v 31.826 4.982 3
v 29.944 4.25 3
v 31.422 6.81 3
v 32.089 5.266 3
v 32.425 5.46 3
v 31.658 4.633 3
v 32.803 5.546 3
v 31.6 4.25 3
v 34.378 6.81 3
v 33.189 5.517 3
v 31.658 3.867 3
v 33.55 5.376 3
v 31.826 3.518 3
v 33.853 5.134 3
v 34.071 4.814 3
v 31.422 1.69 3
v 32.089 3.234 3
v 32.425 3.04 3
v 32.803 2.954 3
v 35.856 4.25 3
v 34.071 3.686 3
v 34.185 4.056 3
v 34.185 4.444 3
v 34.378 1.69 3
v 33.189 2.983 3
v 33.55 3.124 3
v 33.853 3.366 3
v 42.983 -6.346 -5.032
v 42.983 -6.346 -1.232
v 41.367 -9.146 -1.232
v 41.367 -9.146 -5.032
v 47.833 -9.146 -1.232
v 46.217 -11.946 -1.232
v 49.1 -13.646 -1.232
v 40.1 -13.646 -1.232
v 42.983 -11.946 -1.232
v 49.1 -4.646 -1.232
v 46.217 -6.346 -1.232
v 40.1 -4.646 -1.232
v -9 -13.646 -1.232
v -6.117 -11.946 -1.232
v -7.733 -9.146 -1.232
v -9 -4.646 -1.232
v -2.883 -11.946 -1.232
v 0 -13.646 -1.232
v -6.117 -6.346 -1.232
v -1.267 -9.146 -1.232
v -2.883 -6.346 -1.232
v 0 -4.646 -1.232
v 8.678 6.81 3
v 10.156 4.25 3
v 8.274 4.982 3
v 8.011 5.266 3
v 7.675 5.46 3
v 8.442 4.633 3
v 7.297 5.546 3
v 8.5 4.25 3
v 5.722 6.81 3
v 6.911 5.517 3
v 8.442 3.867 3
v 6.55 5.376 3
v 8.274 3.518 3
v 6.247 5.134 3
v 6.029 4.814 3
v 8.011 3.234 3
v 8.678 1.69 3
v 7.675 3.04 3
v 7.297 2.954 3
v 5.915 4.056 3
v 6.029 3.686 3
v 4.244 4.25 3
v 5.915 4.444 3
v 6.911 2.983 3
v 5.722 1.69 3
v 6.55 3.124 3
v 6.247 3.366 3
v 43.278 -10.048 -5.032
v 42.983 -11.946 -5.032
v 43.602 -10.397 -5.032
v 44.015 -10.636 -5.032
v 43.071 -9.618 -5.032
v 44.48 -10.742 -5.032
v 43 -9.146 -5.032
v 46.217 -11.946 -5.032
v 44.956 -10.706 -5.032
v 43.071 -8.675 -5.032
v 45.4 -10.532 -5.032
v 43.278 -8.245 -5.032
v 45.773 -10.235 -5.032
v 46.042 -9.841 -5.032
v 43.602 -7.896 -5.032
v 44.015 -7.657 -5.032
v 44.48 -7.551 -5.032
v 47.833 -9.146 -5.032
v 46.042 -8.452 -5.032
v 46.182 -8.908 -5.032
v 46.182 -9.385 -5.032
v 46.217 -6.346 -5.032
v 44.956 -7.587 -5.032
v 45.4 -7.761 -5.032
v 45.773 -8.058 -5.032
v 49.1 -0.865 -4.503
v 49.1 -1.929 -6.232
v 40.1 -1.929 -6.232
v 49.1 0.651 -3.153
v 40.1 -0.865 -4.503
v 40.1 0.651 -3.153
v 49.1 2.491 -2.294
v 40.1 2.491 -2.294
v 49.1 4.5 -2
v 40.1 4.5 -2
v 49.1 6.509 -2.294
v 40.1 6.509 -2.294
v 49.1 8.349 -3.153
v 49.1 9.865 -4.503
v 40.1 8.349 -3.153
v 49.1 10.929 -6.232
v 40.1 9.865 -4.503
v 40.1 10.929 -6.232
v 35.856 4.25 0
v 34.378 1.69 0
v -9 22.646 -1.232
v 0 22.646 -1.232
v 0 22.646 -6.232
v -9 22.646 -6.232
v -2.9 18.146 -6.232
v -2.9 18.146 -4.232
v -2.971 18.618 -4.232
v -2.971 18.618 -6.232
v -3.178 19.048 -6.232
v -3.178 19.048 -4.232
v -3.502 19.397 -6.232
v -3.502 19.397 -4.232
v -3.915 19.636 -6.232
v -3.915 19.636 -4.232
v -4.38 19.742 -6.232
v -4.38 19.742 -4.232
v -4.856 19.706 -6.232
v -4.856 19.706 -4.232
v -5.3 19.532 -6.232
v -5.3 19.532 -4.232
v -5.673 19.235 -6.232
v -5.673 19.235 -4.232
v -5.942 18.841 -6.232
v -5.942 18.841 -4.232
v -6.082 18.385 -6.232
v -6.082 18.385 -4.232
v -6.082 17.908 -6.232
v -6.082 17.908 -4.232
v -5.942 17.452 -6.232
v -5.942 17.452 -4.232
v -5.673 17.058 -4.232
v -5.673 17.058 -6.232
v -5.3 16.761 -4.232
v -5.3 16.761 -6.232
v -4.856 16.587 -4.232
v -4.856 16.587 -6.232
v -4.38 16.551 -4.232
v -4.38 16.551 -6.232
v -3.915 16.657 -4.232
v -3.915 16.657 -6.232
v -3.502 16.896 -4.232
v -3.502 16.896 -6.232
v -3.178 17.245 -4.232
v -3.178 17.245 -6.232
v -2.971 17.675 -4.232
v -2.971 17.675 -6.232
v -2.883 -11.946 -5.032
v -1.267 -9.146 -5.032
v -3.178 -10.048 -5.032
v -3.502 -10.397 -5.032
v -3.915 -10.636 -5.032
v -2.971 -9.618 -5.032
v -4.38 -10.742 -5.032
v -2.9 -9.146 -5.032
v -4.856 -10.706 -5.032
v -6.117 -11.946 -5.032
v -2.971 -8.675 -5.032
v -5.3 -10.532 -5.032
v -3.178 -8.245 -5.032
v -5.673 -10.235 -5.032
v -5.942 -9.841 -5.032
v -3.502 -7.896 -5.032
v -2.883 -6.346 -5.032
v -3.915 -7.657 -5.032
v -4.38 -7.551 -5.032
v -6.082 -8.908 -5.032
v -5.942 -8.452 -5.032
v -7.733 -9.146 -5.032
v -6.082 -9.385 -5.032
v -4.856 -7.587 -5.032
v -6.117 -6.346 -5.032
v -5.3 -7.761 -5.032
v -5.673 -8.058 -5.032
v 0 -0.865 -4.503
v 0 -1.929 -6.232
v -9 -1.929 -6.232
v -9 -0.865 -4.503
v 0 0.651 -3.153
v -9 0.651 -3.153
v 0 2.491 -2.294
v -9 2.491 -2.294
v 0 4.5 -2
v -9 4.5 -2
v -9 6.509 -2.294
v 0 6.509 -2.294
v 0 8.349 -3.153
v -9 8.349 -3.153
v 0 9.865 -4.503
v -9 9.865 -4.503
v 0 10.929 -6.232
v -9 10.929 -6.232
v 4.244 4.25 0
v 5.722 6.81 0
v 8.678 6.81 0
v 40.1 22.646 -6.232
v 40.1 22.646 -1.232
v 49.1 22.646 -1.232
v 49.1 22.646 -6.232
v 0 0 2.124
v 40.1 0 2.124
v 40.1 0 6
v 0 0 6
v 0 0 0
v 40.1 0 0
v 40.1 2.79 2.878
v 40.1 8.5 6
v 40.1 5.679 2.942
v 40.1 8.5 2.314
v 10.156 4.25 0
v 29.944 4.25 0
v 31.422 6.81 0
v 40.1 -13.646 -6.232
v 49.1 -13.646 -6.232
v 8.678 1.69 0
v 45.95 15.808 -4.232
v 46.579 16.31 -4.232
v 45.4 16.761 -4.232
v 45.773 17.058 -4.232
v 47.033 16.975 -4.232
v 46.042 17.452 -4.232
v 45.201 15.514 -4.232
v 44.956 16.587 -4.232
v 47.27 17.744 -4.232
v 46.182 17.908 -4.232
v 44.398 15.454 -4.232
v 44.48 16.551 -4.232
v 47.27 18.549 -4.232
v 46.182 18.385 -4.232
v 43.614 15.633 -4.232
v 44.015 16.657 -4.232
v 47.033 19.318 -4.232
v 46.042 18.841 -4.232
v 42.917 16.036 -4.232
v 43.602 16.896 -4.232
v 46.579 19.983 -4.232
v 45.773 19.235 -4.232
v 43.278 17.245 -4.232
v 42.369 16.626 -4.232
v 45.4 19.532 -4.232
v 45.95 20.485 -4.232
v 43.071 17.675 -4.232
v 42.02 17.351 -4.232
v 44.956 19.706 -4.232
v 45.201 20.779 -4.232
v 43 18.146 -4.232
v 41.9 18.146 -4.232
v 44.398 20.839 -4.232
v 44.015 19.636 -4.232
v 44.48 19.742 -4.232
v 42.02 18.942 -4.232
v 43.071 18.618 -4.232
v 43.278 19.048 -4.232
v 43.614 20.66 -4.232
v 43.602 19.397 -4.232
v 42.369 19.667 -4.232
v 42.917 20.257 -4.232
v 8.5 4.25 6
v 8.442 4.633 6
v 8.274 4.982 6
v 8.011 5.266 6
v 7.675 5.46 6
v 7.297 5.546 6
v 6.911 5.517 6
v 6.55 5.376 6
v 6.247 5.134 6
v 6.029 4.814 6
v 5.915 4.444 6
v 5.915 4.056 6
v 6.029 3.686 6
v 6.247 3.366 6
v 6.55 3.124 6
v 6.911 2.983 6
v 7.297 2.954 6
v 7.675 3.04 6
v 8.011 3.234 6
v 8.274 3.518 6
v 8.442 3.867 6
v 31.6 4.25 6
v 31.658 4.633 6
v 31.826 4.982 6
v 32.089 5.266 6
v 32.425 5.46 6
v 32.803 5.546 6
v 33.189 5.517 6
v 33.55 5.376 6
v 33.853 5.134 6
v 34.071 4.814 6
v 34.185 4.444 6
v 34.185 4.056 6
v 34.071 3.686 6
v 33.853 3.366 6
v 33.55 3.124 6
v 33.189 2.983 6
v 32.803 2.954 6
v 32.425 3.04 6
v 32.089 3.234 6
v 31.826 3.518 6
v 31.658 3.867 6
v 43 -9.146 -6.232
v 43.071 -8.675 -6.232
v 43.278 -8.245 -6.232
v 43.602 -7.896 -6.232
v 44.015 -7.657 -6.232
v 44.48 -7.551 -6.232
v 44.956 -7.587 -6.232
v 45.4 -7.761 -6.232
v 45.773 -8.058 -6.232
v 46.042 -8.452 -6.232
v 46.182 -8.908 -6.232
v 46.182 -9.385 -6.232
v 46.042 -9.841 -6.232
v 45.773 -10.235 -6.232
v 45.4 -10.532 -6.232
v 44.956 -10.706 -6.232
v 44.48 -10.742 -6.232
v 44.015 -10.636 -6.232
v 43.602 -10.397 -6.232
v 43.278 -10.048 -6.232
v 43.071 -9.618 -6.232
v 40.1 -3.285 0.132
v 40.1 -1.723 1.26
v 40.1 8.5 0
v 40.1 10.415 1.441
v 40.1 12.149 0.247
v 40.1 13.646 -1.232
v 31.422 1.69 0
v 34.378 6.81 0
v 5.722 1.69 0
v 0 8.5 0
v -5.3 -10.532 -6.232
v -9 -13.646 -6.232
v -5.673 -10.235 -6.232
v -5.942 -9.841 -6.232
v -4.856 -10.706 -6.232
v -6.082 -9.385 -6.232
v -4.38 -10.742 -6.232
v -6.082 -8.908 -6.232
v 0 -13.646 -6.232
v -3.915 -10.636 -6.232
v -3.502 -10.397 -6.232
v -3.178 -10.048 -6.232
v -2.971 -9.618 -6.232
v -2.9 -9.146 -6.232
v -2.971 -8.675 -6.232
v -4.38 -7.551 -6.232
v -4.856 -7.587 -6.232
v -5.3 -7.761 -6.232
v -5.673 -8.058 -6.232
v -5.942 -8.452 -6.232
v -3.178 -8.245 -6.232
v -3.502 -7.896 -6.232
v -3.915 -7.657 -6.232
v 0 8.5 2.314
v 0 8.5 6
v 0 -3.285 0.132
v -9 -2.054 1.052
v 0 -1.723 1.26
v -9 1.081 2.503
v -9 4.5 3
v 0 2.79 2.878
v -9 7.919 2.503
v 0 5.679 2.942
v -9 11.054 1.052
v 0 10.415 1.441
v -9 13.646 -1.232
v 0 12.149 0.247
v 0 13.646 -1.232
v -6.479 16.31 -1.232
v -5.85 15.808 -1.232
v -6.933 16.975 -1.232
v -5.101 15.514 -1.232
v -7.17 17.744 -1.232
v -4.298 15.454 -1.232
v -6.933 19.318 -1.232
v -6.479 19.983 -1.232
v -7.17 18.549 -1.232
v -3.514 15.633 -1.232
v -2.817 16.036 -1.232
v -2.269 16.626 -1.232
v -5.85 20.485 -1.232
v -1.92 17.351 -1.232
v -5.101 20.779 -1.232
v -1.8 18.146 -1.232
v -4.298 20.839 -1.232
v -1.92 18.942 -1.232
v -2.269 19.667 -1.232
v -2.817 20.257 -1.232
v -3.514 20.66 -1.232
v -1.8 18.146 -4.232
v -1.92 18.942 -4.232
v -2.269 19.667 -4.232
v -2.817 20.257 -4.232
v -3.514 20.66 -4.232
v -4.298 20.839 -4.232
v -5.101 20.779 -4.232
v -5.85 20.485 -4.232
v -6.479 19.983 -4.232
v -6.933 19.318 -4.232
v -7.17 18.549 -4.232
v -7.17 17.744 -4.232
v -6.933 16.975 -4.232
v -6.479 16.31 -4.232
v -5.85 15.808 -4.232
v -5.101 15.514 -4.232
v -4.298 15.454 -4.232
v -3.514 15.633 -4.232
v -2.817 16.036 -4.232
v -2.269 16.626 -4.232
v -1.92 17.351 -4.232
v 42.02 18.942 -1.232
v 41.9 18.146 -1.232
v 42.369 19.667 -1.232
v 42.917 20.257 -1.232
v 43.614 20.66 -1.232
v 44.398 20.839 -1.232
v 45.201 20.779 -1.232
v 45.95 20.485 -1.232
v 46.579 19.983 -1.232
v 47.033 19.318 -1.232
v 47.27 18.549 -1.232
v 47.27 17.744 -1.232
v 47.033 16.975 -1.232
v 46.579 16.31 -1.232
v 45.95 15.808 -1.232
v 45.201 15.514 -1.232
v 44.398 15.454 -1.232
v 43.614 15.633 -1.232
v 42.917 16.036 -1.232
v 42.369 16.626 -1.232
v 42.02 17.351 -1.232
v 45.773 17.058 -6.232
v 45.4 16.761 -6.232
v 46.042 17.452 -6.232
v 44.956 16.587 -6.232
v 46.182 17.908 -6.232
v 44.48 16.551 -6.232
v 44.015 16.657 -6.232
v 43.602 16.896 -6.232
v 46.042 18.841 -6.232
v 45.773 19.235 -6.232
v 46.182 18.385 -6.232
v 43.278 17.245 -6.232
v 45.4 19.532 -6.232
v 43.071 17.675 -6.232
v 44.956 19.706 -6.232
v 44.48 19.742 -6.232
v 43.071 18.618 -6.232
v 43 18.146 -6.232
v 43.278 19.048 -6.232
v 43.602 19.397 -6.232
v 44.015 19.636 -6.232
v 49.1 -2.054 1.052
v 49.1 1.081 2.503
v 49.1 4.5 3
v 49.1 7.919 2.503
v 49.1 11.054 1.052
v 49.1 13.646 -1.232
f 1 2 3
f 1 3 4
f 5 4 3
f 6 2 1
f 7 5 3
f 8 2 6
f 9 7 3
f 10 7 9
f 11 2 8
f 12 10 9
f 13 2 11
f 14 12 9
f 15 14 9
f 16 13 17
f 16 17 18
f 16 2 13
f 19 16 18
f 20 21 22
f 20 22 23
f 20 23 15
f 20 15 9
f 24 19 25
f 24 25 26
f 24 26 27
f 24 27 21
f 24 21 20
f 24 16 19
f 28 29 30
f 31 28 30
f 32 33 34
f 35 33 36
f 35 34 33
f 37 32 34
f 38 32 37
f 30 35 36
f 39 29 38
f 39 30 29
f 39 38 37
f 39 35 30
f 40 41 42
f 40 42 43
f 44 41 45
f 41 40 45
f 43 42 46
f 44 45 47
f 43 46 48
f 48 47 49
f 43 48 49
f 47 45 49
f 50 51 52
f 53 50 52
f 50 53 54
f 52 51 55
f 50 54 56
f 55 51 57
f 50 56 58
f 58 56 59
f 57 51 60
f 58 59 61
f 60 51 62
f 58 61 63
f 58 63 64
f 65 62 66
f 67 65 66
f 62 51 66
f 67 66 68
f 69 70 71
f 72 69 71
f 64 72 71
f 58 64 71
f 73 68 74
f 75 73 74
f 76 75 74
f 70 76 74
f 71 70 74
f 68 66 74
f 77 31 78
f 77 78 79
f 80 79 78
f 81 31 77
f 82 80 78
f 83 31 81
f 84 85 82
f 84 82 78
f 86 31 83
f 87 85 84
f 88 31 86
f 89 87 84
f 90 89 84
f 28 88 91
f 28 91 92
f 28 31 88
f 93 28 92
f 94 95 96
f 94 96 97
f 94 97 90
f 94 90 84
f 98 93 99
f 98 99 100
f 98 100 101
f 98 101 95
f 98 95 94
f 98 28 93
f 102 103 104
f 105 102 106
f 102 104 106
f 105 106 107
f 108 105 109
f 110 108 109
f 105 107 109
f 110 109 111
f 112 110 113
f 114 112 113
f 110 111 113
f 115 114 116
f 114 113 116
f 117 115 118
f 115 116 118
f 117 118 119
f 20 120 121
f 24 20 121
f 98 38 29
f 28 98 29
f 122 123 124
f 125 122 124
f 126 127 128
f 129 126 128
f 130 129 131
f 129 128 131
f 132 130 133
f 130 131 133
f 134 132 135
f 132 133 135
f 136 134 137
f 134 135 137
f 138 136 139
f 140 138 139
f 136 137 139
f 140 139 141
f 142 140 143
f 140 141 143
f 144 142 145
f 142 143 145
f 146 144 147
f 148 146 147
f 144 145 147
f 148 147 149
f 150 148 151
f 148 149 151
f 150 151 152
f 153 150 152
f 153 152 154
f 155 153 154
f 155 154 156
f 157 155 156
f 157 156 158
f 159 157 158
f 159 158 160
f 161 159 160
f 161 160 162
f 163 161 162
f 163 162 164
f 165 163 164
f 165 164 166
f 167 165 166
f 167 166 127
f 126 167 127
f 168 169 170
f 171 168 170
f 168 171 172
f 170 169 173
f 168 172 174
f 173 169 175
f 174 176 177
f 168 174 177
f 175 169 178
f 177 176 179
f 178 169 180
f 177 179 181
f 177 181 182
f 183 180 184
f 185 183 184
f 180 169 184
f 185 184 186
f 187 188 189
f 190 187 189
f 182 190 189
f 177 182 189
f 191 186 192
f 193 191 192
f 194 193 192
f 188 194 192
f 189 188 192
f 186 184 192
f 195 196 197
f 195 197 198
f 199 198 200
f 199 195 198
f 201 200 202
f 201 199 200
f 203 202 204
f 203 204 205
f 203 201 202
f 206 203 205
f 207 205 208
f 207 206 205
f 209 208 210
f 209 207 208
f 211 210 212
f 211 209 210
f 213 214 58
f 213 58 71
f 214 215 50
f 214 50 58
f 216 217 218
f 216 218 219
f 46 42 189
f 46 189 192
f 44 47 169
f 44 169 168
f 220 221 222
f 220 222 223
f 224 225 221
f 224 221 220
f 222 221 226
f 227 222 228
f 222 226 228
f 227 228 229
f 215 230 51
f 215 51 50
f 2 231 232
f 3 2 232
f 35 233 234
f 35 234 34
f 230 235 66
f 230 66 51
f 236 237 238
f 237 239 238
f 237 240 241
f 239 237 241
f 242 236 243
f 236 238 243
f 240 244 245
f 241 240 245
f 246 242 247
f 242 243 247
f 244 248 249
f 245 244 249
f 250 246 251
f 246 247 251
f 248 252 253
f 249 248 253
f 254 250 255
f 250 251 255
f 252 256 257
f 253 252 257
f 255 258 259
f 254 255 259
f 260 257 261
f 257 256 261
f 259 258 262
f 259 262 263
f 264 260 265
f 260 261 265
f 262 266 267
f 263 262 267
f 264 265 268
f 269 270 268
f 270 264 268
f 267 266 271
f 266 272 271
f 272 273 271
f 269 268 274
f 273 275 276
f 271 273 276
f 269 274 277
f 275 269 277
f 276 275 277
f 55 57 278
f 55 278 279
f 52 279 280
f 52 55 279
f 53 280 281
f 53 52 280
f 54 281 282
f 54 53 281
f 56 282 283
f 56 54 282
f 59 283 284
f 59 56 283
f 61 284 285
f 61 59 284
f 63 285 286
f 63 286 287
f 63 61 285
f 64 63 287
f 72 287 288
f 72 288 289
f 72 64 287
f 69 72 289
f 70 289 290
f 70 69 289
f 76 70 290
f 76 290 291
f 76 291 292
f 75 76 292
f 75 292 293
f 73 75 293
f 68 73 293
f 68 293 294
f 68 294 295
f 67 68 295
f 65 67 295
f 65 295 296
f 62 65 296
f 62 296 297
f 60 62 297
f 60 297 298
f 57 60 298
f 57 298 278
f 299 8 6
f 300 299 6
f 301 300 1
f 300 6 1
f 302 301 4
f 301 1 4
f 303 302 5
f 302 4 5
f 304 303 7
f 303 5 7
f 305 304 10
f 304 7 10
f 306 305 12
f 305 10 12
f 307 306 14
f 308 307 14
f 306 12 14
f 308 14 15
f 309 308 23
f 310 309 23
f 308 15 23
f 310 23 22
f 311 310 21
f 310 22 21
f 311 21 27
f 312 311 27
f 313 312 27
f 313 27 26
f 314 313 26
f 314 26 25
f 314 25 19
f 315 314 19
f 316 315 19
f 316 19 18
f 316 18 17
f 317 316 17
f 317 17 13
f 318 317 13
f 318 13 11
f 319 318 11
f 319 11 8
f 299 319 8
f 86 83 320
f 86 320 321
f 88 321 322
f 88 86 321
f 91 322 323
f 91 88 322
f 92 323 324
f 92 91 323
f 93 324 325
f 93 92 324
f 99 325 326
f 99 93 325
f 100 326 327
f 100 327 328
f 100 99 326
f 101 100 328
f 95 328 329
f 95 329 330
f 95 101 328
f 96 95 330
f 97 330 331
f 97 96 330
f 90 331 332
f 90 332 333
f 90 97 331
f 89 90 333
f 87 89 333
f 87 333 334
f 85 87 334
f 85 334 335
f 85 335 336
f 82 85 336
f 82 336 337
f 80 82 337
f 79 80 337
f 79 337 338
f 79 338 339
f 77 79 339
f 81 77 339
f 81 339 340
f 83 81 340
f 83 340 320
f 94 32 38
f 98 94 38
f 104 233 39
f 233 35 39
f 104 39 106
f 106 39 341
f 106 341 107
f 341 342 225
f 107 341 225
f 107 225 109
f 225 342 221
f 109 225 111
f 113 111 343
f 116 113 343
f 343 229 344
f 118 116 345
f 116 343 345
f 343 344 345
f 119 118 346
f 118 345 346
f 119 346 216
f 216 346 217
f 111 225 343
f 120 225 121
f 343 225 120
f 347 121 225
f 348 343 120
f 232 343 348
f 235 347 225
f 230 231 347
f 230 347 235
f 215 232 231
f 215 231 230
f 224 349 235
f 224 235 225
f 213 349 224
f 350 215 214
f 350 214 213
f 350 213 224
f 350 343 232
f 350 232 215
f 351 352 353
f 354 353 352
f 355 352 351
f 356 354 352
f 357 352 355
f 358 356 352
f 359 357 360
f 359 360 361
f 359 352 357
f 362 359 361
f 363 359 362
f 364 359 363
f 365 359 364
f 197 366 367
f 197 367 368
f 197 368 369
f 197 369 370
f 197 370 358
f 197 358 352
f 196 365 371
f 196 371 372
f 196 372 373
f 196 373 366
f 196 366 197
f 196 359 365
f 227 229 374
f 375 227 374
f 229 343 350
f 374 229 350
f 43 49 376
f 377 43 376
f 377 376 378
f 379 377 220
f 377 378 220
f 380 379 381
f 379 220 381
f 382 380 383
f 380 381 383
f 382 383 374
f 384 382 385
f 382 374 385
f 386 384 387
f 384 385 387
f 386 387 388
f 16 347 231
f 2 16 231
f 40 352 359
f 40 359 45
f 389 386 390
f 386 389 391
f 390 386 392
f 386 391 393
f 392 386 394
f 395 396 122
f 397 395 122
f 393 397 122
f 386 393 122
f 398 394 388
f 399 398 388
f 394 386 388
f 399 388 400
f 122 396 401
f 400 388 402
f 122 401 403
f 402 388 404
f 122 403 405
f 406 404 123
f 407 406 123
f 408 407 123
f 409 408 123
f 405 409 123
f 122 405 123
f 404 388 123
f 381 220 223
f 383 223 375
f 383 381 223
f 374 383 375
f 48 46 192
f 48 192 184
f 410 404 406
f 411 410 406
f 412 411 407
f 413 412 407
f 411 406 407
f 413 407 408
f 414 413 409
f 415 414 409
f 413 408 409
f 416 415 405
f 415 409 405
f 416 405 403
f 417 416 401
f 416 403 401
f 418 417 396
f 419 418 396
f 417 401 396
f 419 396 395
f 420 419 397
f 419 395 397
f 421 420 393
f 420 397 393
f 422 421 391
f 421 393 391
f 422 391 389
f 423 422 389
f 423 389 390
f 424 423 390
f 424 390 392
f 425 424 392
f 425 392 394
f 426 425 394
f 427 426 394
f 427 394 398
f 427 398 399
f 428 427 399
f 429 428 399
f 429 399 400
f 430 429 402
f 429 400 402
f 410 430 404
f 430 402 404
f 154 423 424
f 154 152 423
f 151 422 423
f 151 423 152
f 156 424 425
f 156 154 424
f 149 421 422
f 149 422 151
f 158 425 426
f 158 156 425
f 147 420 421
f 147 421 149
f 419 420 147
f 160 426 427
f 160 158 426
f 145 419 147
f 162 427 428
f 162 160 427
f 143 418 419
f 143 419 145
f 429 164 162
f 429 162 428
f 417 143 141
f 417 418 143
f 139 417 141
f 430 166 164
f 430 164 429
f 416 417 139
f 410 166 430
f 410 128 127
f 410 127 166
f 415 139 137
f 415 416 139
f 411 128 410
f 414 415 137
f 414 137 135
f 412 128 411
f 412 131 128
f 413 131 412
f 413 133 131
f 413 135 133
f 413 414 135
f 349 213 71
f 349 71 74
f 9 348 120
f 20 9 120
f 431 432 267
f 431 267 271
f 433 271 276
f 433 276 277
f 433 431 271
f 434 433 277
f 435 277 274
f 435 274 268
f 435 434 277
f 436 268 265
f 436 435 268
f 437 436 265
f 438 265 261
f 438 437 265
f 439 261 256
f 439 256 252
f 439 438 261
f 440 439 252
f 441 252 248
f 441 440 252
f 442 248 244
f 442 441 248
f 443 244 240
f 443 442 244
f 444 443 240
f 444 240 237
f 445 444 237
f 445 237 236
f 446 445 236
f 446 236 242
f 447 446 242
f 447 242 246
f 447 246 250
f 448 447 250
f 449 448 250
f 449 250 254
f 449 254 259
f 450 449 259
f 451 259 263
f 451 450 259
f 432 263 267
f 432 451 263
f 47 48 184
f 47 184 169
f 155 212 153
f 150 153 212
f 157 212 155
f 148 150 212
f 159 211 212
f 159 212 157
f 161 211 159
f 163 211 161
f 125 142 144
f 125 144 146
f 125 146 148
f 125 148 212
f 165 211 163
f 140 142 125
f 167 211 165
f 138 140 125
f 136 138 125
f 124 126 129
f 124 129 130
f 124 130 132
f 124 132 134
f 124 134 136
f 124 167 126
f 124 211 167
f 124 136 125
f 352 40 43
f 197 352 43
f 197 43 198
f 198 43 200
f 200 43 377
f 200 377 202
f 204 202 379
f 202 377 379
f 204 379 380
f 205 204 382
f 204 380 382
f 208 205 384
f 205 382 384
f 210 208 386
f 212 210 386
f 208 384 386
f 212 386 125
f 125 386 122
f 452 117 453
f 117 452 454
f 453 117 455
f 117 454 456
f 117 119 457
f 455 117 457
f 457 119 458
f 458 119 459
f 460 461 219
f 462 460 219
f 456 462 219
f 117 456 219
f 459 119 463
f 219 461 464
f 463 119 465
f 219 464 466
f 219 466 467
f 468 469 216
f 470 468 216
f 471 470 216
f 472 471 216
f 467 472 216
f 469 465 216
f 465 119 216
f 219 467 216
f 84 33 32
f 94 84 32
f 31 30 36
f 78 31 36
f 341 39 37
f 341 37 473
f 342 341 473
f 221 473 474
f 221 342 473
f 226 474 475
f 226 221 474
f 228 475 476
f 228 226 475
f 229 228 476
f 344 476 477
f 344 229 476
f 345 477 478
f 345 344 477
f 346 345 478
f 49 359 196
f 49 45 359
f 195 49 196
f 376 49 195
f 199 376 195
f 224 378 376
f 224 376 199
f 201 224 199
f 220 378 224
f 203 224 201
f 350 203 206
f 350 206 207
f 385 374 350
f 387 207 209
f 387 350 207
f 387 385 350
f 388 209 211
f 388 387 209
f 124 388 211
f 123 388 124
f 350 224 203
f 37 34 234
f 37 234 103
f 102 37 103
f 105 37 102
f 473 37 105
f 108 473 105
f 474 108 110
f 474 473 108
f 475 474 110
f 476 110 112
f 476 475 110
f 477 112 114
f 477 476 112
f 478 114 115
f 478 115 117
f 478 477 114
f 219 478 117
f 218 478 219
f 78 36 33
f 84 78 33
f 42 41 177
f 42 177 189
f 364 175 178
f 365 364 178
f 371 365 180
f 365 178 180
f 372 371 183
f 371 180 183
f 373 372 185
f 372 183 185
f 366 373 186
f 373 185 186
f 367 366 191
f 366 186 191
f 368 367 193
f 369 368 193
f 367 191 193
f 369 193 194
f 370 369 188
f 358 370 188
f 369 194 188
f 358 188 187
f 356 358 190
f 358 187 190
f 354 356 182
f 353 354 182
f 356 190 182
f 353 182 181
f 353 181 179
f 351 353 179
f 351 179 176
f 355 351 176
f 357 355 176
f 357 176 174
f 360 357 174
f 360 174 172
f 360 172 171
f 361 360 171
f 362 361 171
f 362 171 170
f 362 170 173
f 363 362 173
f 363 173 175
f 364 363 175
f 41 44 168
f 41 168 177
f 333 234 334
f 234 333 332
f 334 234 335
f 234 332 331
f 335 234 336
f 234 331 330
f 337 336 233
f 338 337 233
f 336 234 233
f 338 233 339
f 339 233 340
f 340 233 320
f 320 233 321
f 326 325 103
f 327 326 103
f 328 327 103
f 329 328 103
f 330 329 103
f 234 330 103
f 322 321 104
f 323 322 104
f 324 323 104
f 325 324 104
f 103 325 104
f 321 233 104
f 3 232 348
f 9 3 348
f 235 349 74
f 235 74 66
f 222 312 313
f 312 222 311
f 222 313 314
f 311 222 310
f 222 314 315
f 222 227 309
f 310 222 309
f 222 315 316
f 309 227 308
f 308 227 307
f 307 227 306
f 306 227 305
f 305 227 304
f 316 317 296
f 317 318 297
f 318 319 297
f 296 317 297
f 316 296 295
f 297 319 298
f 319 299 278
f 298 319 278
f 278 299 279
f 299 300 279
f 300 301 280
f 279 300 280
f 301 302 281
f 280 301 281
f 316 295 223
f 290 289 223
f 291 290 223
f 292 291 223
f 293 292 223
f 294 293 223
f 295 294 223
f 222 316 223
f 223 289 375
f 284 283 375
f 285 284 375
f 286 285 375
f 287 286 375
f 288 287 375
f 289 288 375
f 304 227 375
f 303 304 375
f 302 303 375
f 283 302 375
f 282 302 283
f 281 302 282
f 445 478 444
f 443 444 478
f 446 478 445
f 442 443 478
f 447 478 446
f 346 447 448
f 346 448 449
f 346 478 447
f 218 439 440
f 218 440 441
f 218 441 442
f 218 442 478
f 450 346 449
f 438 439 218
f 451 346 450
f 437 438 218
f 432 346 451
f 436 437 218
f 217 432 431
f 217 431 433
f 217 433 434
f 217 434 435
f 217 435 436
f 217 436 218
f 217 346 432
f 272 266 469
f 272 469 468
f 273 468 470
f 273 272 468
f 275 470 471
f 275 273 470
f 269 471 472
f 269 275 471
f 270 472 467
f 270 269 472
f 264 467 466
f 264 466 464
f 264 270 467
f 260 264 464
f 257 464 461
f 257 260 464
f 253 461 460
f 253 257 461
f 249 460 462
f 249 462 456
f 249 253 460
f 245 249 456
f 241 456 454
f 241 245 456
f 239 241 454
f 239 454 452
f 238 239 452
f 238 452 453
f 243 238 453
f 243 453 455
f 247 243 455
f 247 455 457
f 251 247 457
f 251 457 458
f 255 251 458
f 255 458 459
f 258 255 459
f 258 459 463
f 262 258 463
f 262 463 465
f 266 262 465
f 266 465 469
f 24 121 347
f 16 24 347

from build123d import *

# Parameters (mm, degrees)
SKETCH_W        = 20.1
SKETCH_H        = 8.5
SKETCH_R        = 1.3
PAD_DEPTH       = 6
POCKET_DEPTH    = 3
PAD001_DEPTH    = 9
SKETCH003_R     = 1.6
POCKET001_DEPTH = 5
POCKET002_DEPTH = 3.8
SKETCH005_R     = 2.7
POCKET003_DEPTH = 3


with BuildPart() as pocket003:
    # Sketch → Pad (new body)
    with BuildSketch(Plane.XY):
        with Locations((10.05, 4.25)):
            Rectangle(SKETCH_W, SKETCH_H)
        with Locations((7.2, 4.25)):
            Circle(SKETCH_R, mode=Mode.SUBTRACT)
    extrude(amount=PAD_DEPTH)

    # Sketch001 → Pocket (cut)
    with BuildSketch(Plane(origin=(0, 0, 0), x_dir=(1, 0, 0), z_dir=(0, 0, -1))):
        Polygon((5.721983, -1.69), (8.678017, -1.69), (10.156033, -4.25), (8.678017, -6.81), (5.721983, -6.81), (4.243967, -4.25), align=None)
    extrude(amount=-POCKET_DEPTH, mode=Mode.SUBTRACT)

    # Sketch002 → Pad001 (new body)
    with BuildSketch(Plane(origin=(0, 0, 0), x_dir=(0, -1, 0), z_dir=(-1, 0, 0))):
        with BuildLine():
            ThreePointArc((1.92947, -6.231983), (-4.5, -2), (-10.92947, -6.231983))
            Line((-10.92947, -6.231983), (-22.64647, -6.231983))
            Line((-22.64647, -1.231983), (-22.64647, -6.231983))
            Line((-13.64647, -1.231983), (-22.64647, -1.231983))
            ThreePointArc((4.64647, -1.231983), (-4.5, 3), (-13.64647, -1.231983))
            Line((13.64647, -1.231983), (4.64647, -1.231983))
            Line((13.64647, -6.231983), (13.64647, -1.231983))
            Line((13.64647, -6.231983), (1.92947, -6.231983))
        make_face()
    extrude(amount=PAD001_DEPTH)

    # Sketch003 → Pocket001 (cut)
    with BuildSketch(Plane.XY.offset(-1.231983)):
        with Locations((-4.5, 18.14647)):
            Circle(SKETCH003_R)
        with Locations((-4.5, -9.14647)):
            Circle(SKETCH003_R)
    extrude(amount=-POCKET001_DEPTH, mode=Mode.SUBTRACT)

    # Sketch004 → Pocket002 (cut)
    with BuildSketch(Plane.XY.offset(-1.231983)):
        Polygon((-6.116581, -6.34647), (-2.883419, -6.34647), (-1.266838, -9.14647), (-2.883419, -11.94647), (-6.116581, -11.94647), (-7.733162, -9.14647), align=None)
    extrude(amount=-POCKET002_DEPTH, mode=Mode.SUBTRACT)

    # Sketch005 → Pocket003 (cut)
    with BuildSketch(Plane.XY.offset(-1.231983)):
        with Locations((-4.5, 18.14647)):
            Circle(SKETCH005_R)
    extrude(amount=-POCKET003_DEPTH, mode=Mode.SUBTRACT)


with BuildPart() as part_mirroring:
    # Part__Mirroring: instance of Pocket003
    add(pocket003.part.mirror(Plane(origin=(0, 0, 0), x_dir=(0, -1, 0), z_dir=(1, 0, 0))))


with BuildPart() as part_mirroring_1:
    # Part__Mirroring placement: moved
    add(part_mirroring.part.moved(Location((40.1, 0, 0))))


with BuildPart() as fusion:
    # Fusion base: copy of Pocket003
    add(pocket003.part)

    # Fusion: union Part__Mirroring
    add(part_mirroring_1.part)


solid = fusion.part
